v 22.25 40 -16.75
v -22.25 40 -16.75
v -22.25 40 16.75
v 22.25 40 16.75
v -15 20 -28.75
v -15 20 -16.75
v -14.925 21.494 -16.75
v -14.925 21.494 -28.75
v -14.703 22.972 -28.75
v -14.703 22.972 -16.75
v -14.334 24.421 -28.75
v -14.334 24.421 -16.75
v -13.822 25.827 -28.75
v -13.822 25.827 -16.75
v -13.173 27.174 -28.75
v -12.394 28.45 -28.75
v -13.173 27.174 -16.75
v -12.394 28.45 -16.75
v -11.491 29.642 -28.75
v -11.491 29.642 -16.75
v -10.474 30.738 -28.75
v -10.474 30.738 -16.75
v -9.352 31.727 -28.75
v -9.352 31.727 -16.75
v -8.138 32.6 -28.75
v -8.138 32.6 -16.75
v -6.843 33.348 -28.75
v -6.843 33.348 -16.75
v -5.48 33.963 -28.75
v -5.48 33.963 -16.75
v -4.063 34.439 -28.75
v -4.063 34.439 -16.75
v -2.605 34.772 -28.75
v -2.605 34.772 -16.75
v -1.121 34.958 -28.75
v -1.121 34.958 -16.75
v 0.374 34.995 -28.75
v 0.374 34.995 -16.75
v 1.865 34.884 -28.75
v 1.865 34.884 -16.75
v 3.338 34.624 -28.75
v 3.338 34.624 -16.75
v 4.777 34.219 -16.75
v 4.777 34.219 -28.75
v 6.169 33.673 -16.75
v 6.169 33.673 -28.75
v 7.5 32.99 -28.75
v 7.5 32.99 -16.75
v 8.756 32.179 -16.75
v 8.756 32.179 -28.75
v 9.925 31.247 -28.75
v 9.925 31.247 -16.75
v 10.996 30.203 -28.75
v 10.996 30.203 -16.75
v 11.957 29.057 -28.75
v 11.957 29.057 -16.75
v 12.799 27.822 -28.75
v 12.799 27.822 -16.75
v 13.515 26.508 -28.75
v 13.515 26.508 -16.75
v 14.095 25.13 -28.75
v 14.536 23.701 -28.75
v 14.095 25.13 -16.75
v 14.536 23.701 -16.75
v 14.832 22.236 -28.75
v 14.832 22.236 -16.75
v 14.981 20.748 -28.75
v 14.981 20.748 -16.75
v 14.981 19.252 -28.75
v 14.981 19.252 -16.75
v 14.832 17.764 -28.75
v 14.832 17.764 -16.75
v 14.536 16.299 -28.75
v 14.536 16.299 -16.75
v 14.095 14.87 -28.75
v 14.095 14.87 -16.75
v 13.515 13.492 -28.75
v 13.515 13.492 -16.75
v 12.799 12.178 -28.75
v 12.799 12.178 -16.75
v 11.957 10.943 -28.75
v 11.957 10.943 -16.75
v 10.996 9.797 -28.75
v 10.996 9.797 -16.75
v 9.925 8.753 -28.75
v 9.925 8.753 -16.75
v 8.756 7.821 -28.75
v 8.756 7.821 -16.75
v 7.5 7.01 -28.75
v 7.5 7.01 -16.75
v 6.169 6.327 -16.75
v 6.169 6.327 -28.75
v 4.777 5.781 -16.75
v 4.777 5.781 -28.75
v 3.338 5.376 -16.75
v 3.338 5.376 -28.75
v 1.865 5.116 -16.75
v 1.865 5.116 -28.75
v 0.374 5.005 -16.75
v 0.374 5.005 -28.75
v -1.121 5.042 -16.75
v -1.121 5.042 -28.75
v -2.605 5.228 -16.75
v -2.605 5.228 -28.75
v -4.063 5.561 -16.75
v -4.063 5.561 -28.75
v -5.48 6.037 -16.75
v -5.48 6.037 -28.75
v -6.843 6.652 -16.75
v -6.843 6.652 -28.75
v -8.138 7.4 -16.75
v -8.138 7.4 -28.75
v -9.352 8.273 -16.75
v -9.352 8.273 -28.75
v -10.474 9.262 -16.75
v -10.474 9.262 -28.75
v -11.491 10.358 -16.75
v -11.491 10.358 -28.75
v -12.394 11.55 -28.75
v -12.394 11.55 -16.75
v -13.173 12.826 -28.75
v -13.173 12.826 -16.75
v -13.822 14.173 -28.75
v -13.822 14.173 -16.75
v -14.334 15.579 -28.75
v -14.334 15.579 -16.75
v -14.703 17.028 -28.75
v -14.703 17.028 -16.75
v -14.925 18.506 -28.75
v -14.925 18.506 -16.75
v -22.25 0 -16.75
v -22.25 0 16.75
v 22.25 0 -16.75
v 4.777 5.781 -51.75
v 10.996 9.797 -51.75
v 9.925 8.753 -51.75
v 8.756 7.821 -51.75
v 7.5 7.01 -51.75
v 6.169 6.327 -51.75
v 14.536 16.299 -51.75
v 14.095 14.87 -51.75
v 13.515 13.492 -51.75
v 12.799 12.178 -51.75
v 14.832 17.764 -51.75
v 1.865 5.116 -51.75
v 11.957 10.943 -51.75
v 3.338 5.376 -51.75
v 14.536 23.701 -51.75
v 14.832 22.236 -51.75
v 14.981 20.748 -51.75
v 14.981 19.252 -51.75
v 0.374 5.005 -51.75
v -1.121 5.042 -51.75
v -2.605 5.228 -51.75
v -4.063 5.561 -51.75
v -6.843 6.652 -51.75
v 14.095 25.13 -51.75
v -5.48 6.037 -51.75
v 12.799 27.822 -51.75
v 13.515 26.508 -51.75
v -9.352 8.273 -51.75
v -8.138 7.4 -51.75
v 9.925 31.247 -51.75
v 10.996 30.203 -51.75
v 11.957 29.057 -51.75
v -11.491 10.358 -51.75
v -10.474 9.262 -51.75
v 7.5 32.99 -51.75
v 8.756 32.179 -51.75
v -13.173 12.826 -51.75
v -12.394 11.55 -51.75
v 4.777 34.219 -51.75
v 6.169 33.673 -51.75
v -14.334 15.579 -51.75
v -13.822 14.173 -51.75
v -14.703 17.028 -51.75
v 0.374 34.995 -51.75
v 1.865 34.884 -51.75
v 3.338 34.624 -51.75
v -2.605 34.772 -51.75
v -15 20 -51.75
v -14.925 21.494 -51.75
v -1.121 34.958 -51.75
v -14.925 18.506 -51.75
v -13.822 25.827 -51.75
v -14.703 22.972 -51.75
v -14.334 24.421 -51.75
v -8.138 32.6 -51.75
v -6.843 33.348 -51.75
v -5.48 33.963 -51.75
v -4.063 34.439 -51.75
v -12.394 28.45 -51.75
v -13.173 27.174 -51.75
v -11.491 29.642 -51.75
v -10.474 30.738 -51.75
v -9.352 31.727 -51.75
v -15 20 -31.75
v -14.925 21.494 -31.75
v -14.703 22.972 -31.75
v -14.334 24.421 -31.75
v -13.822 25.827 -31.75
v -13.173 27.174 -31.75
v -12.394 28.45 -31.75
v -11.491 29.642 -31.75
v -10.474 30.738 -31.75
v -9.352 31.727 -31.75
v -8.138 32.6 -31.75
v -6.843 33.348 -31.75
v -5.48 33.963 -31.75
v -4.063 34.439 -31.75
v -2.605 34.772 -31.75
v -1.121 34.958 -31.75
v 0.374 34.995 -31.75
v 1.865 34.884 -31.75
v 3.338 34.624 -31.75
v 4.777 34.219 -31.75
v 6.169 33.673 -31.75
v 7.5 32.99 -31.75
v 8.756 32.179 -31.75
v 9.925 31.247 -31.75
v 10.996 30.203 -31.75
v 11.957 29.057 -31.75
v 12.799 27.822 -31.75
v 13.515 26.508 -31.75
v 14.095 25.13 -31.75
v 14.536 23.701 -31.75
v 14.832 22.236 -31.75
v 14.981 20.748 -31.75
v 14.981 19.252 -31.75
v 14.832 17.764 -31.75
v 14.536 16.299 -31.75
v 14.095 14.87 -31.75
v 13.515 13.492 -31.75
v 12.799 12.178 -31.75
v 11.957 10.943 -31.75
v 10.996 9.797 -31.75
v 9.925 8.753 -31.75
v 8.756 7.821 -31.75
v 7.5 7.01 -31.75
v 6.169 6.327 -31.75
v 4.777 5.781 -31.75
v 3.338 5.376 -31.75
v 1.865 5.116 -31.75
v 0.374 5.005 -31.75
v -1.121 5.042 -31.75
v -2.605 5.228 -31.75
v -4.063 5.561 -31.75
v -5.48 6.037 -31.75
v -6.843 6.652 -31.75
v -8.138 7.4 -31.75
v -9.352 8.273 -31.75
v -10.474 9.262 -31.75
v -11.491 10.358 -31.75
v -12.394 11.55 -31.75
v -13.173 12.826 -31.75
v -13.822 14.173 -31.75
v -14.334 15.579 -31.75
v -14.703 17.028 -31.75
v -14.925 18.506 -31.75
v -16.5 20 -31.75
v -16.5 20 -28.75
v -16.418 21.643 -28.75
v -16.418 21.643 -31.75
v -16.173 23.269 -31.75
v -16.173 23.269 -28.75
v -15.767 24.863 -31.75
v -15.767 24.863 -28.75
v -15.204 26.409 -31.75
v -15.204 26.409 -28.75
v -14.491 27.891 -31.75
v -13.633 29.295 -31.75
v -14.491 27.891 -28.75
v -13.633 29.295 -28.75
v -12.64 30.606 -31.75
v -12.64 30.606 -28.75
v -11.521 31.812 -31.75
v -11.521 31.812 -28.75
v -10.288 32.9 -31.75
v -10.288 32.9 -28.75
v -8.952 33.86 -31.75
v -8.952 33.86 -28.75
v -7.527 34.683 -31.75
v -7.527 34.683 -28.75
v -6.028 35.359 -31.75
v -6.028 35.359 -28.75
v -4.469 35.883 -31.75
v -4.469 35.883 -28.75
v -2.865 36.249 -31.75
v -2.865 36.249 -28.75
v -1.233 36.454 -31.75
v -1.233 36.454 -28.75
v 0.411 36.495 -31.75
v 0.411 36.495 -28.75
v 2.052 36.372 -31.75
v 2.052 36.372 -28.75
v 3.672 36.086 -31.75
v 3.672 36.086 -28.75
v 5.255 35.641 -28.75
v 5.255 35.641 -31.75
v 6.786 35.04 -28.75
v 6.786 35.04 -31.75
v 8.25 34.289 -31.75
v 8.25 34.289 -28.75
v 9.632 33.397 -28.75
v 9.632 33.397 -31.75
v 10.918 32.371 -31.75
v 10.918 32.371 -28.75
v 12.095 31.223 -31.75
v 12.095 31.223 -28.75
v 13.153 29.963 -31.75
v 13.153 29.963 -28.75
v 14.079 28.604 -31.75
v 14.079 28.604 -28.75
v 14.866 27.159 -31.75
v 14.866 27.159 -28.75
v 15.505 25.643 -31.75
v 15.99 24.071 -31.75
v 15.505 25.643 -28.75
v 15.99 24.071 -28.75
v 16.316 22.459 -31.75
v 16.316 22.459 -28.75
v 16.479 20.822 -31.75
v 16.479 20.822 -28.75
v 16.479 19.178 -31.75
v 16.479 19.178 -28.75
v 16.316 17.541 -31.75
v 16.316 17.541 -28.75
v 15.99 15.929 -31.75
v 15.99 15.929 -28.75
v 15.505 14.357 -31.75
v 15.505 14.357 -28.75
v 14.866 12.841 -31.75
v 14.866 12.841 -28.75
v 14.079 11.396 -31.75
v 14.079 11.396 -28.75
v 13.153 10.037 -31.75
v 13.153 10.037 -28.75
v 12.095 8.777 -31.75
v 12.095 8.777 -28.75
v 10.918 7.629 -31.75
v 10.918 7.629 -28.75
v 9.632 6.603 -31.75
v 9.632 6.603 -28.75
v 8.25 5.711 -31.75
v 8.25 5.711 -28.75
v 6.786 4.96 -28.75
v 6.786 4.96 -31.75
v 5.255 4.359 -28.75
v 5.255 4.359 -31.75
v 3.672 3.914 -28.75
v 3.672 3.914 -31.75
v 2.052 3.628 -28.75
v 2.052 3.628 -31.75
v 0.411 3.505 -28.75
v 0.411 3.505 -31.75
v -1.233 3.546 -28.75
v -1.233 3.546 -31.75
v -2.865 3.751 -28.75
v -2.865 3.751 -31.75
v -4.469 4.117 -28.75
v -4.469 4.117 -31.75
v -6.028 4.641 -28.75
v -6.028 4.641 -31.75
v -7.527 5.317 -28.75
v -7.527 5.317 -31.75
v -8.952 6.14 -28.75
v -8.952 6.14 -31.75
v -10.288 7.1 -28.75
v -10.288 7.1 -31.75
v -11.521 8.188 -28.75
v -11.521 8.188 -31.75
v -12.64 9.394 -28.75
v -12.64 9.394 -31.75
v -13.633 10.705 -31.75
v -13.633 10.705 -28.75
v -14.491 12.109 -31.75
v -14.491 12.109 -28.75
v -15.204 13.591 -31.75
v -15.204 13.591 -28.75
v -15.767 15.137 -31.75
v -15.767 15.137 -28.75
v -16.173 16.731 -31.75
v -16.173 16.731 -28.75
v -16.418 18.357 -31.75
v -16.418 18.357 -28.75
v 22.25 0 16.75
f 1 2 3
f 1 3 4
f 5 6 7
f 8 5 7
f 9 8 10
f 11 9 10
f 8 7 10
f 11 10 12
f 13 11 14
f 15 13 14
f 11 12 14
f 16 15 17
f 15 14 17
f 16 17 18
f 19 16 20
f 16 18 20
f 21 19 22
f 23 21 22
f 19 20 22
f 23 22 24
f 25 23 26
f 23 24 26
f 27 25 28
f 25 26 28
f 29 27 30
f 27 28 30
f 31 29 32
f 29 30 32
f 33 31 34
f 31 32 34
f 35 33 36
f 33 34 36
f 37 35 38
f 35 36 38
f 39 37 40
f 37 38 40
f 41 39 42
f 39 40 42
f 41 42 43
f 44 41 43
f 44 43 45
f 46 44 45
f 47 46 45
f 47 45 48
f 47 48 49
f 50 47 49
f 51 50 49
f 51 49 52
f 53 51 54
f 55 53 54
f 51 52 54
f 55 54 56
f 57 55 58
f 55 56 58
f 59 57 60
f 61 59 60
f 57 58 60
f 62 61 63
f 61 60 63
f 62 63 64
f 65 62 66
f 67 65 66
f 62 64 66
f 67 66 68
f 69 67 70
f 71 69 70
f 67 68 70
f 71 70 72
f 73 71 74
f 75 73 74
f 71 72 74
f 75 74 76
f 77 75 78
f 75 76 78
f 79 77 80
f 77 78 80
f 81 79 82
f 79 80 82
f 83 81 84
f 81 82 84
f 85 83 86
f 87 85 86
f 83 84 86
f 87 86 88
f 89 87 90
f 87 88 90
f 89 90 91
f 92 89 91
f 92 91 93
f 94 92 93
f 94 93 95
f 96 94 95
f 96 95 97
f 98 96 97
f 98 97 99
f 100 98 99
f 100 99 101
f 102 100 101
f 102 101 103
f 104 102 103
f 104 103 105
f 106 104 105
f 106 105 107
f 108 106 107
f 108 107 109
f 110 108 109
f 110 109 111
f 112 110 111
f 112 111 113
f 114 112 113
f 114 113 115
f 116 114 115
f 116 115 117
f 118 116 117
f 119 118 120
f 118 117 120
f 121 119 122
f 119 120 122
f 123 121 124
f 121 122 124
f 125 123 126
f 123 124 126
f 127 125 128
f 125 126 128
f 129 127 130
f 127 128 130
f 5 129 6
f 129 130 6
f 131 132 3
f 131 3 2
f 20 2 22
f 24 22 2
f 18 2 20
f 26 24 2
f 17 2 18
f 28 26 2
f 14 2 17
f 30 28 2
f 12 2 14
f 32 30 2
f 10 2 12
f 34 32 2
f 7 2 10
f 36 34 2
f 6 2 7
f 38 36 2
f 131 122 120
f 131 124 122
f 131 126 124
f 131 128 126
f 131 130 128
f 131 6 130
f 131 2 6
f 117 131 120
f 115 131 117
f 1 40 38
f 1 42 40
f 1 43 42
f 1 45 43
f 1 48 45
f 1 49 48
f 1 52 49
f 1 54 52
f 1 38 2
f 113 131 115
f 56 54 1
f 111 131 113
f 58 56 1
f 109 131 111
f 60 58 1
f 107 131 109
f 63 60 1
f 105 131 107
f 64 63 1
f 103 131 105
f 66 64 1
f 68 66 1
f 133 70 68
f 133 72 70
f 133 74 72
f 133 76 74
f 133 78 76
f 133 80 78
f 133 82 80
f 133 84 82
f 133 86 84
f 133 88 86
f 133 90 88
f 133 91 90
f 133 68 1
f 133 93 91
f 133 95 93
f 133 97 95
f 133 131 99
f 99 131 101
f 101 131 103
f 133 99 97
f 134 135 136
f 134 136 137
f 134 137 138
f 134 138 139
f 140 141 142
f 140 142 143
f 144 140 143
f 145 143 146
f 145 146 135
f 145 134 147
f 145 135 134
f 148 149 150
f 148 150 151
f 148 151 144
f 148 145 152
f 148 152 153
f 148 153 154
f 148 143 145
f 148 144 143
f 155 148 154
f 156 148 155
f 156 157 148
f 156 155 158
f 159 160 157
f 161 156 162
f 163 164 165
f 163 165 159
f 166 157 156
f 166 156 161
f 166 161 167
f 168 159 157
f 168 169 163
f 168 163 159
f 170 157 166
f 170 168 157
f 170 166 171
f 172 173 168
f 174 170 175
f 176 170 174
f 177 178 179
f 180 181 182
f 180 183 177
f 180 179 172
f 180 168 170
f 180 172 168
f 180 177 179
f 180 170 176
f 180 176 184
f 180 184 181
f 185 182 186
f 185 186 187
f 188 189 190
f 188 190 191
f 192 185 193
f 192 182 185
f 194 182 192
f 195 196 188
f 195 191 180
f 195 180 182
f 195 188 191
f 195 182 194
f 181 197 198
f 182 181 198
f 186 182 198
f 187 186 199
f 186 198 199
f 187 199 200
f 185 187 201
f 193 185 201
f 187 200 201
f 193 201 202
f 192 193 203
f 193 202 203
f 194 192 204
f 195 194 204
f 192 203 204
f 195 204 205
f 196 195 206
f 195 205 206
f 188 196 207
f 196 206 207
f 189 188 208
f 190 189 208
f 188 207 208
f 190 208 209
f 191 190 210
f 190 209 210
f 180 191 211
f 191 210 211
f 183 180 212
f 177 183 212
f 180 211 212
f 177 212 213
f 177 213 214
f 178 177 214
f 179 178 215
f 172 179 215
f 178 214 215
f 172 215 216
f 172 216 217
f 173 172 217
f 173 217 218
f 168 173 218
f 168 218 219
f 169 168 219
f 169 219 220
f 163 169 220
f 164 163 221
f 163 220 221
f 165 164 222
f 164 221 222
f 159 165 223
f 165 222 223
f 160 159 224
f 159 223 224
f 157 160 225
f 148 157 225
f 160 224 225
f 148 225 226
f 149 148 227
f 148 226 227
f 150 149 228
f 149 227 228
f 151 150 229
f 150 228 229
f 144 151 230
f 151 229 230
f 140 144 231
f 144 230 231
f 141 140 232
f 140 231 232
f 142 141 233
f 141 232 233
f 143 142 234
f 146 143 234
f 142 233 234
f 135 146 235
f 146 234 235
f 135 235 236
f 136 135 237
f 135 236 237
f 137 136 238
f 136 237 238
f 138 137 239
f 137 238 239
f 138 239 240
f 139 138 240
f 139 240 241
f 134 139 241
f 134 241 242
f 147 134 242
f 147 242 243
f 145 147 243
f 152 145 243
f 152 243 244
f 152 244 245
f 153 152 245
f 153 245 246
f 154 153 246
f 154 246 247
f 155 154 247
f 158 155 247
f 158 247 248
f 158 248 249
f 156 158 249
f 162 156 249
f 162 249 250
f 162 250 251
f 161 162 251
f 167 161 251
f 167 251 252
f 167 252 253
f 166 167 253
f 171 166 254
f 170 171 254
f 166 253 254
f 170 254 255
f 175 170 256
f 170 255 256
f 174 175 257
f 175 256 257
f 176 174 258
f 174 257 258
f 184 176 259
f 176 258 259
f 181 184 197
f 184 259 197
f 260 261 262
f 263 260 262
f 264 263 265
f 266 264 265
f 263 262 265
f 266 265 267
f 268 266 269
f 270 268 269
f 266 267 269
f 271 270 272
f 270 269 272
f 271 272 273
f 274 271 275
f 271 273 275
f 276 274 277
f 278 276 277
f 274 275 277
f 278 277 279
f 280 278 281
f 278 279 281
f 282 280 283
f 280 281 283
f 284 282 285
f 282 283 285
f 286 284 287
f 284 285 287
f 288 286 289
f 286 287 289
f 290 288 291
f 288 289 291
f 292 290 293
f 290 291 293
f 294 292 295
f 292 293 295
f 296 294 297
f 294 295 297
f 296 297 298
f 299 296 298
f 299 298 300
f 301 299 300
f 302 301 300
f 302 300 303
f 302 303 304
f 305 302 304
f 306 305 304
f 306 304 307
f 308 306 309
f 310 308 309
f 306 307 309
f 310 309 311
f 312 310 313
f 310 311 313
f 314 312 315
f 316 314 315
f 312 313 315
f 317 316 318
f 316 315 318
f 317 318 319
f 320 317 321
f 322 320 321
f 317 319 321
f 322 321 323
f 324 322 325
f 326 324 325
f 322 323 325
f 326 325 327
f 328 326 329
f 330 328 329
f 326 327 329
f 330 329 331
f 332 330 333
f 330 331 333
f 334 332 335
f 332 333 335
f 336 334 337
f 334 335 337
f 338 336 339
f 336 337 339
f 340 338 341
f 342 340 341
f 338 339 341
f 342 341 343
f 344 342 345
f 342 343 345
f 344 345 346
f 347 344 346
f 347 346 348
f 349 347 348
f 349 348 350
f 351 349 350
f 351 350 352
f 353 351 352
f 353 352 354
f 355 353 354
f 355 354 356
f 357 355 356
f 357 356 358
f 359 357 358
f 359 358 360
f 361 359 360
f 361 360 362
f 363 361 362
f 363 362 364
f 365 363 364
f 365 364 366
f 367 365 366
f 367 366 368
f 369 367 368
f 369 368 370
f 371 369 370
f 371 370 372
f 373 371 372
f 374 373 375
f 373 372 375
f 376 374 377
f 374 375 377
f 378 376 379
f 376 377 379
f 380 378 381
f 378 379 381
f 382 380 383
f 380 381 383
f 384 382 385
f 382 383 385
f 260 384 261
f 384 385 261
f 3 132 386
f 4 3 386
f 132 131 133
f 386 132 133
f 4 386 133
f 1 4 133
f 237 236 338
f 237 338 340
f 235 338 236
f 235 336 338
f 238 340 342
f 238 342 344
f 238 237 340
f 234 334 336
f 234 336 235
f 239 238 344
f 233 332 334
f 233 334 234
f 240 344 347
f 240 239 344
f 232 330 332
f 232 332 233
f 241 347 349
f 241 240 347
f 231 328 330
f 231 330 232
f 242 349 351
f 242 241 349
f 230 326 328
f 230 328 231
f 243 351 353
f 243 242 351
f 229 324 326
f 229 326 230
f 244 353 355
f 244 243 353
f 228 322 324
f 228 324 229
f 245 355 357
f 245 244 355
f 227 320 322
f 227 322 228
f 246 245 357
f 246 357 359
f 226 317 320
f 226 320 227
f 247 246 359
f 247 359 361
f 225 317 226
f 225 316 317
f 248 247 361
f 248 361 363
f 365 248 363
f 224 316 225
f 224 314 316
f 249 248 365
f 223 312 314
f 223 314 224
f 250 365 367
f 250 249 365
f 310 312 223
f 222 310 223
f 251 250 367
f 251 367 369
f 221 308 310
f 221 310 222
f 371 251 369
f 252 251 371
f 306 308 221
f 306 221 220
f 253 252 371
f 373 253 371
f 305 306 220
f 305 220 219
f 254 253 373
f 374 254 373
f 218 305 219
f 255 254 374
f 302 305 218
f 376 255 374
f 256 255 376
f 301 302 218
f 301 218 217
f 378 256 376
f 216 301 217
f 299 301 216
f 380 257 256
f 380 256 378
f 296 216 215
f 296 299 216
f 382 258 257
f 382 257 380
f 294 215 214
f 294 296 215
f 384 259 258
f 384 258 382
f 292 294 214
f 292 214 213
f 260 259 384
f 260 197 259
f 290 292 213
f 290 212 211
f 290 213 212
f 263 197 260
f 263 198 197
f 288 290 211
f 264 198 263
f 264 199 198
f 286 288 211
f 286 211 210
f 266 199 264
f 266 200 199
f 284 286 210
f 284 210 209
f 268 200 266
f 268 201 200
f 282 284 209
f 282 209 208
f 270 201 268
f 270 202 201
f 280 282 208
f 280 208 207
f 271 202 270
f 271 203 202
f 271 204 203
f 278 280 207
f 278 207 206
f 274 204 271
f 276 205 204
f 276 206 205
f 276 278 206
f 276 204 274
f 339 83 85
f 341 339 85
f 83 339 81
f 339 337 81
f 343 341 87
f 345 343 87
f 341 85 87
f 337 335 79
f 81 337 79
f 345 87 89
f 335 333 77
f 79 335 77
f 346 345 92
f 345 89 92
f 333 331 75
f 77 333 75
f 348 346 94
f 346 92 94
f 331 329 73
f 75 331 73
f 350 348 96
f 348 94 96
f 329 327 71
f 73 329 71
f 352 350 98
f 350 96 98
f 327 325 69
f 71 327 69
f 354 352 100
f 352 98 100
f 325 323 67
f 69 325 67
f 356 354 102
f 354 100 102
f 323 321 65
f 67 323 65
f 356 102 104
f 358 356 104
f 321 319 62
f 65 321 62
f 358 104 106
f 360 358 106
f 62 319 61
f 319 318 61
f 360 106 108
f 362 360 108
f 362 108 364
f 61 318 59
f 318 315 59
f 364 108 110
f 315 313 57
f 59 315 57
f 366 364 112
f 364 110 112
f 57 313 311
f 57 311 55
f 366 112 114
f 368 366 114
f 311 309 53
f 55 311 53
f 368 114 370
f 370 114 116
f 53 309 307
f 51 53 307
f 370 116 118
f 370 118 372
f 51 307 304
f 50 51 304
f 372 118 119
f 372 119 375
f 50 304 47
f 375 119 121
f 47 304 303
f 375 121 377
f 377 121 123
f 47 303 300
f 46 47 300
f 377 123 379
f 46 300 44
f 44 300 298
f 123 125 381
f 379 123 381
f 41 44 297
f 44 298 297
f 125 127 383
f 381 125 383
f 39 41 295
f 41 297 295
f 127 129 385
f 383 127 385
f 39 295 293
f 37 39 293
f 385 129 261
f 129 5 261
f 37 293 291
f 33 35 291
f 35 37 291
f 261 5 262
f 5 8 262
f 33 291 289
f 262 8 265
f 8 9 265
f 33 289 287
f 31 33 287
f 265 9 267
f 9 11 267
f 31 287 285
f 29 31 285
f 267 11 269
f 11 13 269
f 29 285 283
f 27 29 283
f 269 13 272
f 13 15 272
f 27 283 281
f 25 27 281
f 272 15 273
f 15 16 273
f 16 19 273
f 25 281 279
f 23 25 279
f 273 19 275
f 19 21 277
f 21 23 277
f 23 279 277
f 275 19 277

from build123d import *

# Parameters (mm, degrees)
SKETCH_1_W      = 44.5
SKETCH_1_H      = 33.5
EXTRUDE_1_DEPTH = 40
SKETCH_2_R      = 15
EXTRUDE_2_DEPTH = 12
SKETCH_3_R      = 16.5
EXTRUDE_3_DEPTH = 3
SKETCH_4_R      = 15
EXTRUDE_4_DEPTH = 20


with BuildPart() as part:
    # 草图1 → 凸台-拉伸1 (new body)
    with BuildSketch(Plane(origin=(0, 0, 0), x_dir=(1, 0, 0), z_dir=(0, 1, 0))):
        Rectangle(SKETCH_1_W, SKETCH_1_H)
    extrude(amount=EXTRUDE_1_DEPTH)

    # 草图2 → 凸台-拉伸2 (add)
    with BuildSketch(Plane(origin=(0, 0, -16.75), x_dir=(-1, 0, 0), z_dir=(0, 0, -1))):
        with Locations((0, 20)):
            Circle(SKETCH_2_R)
    extrude(amount=EXTRUDE_2_DEPTH)

    # 草图3 → 凸台-拉伸3 (add)
    with BuildSketch(Plane(origin=(0, 0, -28.75), x_dir=(-1, 0, 0), z_dir=(0, 0, -1))):
        with Locations((0, 20)):
            Circle(SKETCH_3_R)
    extrude(amount=EXTRUDE_3_DEPTH)

    # 草图4 → 凸台-拉伸4 (add)
    with BuildSketch(Plane(origin=(0, 0, -31.75), x_dir=(-1, 0, 0), z_dir=(0, 0, -1))):
        with Locations((0, 20)):
            Circle(SKETCH_4_R)
    extrude(amount=EXTRUDE_4_DEPTH)


solid = part.part
